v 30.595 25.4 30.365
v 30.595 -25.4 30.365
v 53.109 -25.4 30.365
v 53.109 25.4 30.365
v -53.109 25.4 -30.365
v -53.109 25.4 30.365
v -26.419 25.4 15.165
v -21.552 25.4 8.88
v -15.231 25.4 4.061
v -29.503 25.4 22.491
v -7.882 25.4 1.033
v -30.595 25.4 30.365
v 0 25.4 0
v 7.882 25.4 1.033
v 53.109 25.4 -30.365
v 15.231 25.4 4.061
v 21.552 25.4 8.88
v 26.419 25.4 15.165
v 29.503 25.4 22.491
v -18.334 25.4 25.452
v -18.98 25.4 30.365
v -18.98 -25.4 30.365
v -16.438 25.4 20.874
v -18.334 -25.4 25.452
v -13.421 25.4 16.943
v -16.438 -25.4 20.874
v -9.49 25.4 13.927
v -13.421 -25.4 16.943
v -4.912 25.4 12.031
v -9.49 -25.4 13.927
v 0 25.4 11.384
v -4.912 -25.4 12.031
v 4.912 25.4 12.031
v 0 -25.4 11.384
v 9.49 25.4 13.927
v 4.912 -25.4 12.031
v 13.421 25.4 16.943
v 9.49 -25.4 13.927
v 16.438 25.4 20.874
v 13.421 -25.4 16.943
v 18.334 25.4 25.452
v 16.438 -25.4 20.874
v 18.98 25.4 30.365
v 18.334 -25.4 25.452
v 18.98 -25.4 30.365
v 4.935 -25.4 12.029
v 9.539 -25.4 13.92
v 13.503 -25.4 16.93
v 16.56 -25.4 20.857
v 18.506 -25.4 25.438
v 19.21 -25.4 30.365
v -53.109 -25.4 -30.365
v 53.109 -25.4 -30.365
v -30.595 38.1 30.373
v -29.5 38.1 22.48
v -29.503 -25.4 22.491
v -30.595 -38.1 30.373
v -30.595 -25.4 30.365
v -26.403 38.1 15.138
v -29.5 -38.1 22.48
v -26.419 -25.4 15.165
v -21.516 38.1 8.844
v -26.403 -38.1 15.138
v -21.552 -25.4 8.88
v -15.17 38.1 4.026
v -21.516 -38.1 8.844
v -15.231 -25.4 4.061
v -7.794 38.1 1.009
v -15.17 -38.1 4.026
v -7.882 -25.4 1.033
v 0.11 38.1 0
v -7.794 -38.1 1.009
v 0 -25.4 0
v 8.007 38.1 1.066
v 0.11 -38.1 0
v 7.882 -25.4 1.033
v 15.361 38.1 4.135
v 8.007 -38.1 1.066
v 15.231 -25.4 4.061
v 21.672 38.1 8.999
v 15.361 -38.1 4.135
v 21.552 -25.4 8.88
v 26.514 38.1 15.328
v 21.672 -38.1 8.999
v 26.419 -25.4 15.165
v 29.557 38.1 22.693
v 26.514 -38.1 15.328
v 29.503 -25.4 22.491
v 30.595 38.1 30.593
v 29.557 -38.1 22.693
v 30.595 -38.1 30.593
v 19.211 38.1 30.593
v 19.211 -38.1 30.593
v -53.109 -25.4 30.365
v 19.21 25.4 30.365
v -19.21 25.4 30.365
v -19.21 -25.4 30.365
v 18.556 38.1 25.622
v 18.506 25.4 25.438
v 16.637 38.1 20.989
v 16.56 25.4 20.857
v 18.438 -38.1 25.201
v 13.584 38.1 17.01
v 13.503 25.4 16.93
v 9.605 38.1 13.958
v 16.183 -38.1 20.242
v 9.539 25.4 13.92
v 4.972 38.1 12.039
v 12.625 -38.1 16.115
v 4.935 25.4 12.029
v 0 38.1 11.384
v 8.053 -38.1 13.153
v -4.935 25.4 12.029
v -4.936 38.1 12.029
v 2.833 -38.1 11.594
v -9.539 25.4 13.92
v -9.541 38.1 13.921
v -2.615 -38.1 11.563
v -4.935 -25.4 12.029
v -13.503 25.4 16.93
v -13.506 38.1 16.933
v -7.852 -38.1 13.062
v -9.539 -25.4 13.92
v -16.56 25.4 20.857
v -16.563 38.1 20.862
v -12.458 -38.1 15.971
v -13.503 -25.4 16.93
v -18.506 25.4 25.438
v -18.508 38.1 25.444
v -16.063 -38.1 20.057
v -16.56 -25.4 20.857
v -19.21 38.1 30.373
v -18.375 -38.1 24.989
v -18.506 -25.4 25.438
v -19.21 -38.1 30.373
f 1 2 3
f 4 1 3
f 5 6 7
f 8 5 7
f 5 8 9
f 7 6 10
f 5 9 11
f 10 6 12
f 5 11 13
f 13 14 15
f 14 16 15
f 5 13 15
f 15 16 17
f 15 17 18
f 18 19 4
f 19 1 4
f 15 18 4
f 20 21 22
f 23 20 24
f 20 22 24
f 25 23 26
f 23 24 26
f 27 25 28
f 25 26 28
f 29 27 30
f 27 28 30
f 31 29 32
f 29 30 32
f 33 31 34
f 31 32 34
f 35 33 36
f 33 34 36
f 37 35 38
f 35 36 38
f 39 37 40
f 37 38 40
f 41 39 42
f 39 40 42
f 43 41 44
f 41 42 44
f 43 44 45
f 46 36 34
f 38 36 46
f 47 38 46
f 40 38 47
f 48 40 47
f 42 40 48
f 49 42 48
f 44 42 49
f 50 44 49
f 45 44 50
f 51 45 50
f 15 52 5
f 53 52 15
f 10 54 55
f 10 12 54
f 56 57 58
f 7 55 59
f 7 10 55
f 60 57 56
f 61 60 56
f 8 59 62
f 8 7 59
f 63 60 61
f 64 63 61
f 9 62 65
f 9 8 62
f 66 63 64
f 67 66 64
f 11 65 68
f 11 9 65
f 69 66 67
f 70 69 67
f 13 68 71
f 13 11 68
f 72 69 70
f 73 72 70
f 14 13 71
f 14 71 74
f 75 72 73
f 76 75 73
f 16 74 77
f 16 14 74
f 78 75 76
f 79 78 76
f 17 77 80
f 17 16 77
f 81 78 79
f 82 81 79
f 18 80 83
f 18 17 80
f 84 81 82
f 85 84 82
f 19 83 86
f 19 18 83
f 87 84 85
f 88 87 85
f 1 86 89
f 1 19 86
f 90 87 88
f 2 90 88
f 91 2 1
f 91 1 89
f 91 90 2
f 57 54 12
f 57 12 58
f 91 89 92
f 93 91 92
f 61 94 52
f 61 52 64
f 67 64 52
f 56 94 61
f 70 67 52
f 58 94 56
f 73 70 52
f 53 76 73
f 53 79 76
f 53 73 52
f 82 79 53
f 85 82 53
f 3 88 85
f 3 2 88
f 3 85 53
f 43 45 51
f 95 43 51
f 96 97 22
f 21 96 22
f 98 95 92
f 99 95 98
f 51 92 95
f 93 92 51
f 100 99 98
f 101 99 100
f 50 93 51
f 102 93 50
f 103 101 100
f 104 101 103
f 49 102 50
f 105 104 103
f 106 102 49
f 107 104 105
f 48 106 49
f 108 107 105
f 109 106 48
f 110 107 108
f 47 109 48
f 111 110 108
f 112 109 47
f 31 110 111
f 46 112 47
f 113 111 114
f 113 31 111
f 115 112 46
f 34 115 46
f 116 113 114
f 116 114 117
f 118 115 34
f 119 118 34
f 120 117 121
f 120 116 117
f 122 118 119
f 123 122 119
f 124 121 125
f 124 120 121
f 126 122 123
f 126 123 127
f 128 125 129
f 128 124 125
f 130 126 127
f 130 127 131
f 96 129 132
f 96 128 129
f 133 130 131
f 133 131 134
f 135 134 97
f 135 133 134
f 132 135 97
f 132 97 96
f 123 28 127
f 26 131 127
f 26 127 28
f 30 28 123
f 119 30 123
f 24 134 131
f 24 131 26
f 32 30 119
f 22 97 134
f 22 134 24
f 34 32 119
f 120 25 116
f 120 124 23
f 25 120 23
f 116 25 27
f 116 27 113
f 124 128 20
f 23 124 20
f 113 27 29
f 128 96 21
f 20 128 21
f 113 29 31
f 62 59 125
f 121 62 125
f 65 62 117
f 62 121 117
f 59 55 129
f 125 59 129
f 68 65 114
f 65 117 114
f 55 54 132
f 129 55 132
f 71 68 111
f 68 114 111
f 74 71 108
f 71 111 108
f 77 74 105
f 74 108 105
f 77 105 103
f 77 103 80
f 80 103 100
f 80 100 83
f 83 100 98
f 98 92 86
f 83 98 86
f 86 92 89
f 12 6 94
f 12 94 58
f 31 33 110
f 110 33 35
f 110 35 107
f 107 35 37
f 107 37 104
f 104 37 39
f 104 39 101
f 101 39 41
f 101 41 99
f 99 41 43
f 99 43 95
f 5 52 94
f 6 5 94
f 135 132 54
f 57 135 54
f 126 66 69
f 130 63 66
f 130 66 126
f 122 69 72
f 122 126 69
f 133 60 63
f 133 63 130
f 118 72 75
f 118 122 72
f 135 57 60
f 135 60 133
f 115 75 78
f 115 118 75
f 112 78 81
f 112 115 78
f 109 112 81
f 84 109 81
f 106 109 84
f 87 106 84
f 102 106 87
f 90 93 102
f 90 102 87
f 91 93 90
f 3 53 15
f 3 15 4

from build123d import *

# Parameters (mm, degrees)
F0_W     = 106.2181815505
F0_H     = 60.7290938497
F1_DEPTH = 25.4
F3_DEPTH = 38.1
F5_DEPTH = 152.4


with BuildPart() as f1:
    # F0 (on Front) → F1 (new body, symmetric)
    with BuildSketch(Plane.XZ):
        Rectangle(F0_W, F0_H)
    extrude(amount=F1_DEPTH, both=True)

    # F2 (on Front) → F3 (join, symmetric)
    with BuildSketch(Plane.XZ):
        with BuildLine():
            Line((-19.2100163435, 30.3730540806), (-30.5946469803, 30.3730540806))
            ThreePointArc((-30.5946469803, 30.3730540806), (0.110203176, 0.0001984736), (30.5954552536, 30.5934589507))
            Line((30.5954552536, 30.5934589507), (19.211303606, 30.5934589507))
            ThreePointArc((19.211303606, 30.5934589507), (0.1102043145, 11.3844677012), (-19.2100163435, 30.3730540806))
        make_face()
    extrude(amount=F3_DEPTH, both=True)

    # F4 (on face) → F5 (cut)
    with BuildSketch(Plane.XZ.offset(25.4)):
        with BuildLine():
            ThreePointArc((7.92e-08, 11.3841516089), (13.4211662655, 16.9433807153), (18.9803953159, 30.3645469248))
            Line((18.9803953159, 30.3645469248), (-18.9803953159, 30.3645469248))
            ThreePointArc((-18.9803953159, 30.3645469248), (-13.4211662095, 16.9433806594), (7.92e-08, 11.3841516089))
        make_face()
    extrude(amount=-F5_DEPTH, mode=Mode.SUBTRACT)


solid = f1.part
